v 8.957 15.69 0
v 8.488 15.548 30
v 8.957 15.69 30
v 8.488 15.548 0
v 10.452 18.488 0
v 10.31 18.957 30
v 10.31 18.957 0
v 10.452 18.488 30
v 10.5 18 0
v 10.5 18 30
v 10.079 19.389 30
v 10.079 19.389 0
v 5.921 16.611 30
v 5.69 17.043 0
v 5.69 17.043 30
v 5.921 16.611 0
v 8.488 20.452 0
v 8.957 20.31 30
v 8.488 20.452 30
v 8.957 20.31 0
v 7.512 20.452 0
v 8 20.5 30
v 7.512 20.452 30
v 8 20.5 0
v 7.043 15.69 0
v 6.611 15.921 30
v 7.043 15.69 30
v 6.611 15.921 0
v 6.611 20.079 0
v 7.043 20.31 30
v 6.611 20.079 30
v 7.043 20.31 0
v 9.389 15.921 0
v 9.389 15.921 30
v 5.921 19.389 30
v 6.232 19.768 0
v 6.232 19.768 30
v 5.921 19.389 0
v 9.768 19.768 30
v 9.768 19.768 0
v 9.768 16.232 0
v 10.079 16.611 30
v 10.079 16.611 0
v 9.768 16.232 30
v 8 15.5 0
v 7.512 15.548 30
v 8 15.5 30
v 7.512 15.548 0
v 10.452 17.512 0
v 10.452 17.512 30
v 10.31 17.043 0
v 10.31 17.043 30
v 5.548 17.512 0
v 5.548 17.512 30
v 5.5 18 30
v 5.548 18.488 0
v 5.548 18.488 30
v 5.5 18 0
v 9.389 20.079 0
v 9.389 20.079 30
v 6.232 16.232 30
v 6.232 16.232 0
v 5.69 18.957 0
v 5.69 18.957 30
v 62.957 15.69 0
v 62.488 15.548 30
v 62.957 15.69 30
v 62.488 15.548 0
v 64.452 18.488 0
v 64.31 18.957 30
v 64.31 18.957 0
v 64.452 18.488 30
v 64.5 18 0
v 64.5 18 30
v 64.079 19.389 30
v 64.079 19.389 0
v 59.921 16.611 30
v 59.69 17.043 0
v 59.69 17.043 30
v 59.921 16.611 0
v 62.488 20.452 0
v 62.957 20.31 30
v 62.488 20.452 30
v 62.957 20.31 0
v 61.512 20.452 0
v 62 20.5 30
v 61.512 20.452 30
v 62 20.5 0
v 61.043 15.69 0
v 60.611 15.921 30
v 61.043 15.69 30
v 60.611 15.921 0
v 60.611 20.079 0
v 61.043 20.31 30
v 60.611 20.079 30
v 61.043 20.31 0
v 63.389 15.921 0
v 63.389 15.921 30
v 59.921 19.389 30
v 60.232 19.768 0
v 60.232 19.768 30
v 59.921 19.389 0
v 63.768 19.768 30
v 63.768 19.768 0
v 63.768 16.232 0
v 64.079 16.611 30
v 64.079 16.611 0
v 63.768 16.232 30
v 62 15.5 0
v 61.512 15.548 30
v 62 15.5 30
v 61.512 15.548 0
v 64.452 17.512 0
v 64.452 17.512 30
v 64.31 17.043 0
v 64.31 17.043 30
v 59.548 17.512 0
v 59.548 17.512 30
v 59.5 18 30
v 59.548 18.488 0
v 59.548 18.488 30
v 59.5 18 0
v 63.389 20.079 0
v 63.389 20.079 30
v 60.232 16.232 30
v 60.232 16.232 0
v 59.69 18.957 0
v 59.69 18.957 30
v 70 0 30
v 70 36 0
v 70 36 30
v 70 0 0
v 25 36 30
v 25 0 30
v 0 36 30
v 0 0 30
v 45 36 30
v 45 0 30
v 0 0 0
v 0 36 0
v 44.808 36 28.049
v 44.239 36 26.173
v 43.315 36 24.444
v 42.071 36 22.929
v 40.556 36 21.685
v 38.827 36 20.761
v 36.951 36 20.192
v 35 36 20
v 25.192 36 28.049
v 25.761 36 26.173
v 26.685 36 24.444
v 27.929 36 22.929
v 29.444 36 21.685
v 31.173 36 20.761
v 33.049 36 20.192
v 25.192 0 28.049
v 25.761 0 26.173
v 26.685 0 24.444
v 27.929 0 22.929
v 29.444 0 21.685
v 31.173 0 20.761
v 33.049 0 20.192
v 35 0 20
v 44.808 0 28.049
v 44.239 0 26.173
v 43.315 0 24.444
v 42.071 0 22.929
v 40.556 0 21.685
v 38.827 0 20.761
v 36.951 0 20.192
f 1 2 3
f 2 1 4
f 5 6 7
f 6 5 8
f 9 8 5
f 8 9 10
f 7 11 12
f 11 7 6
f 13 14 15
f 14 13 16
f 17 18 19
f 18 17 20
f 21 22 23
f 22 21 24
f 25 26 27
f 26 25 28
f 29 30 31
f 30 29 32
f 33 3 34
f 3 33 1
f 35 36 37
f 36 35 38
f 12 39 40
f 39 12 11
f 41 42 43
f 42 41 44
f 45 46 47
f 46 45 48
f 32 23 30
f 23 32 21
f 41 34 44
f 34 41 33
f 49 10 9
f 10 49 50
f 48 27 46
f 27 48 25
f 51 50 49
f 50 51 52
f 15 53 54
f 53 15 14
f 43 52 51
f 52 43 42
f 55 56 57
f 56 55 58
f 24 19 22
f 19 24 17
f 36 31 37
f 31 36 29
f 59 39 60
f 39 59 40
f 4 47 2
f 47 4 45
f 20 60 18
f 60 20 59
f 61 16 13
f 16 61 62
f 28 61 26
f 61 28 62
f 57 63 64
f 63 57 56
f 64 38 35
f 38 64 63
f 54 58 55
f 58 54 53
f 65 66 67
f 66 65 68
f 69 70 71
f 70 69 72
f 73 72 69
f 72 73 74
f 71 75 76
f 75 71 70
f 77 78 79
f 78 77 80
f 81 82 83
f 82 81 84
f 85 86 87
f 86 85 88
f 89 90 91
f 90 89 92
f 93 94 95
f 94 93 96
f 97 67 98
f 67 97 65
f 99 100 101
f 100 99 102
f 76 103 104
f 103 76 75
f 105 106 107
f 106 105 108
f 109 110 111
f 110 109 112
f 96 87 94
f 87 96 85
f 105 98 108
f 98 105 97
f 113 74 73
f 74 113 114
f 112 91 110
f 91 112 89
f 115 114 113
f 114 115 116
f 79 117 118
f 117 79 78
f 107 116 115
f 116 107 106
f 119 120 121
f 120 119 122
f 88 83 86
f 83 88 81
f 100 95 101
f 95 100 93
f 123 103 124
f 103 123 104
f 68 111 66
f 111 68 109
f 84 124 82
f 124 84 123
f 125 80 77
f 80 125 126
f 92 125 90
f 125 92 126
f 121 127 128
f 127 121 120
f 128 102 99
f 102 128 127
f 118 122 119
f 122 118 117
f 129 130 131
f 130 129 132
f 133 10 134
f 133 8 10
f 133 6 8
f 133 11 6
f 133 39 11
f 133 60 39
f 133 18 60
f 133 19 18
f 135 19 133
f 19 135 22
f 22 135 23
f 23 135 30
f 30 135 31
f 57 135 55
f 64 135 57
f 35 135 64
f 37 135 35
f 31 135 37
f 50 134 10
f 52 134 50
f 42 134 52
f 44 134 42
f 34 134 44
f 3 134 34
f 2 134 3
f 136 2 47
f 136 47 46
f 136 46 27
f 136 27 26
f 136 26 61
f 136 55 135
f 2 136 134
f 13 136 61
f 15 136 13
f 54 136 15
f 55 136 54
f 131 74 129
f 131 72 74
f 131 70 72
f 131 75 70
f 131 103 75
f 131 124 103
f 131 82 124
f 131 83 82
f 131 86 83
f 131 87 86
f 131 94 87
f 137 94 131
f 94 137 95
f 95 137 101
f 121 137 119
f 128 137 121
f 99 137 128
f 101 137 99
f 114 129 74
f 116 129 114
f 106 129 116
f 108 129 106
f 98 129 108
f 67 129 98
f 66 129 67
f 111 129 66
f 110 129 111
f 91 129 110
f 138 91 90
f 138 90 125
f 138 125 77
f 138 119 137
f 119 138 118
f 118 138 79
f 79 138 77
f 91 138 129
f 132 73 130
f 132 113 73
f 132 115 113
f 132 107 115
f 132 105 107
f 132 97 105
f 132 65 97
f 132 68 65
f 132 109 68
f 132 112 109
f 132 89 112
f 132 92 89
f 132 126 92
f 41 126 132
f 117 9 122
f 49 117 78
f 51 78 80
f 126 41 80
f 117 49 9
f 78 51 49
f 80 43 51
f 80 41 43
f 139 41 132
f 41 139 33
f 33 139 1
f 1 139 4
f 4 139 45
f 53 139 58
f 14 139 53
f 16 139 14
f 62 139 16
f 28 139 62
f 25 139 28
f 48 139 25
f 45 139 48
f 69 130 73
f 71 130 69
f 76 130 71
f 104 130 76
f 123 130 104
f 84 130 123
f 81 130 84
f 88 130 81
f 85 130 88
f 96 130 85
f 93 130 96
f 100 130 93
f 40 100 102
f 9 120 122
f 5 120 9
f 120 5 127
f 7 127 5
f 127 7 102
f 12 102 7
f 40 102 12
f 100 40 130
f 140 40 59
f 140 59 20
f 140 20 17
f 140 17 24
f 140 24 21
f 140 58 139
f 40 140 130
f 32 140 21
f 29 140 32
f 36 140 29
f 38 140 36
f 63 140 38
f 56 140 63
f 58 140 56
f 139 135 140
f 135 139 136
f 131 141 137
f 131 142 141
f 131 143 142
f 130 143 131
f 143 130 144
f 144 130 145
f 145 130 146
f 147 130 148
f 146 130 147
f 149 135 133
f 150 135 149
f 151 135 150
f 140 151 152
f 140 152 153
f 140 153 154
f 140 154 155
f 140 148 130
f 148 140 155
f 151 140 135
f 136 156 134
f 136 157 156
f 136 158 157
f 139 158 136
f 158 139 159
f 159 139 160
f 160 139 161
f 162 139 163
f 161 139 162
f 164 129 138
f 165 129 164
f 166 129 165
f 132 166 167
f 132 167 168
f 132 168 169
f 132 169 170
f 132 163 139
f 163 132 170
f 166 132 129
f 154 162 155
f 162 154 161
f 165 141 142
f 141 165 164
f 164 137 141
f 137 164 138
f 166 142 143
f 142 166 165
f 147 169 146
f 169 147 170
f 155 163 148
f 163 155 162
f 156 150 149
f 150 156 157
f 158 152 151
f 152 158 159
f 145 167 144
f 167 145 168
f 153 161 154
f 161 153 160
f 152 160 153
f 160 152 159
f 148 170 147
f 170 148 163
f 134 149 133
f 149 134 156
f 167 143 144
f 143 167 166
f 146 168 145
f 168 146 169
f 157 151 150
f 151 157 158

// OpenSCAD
$fn = 32;

// ----------------------------------------------------------------------
// Saddle clamp: plain shaft clamp
// ----------------------------------------------------------------------

// --- parameters (mm) ---
blk_l = 70;               // block length, X
blk_w = 36;               // block width, Y
blk_h = 30;               // block height
clamp_r = 10;             // shaft groove radius
hole_r = 2.5;             // bolt hole radius
hole_m = 8;               // bolt hole margin from the ends

saw_depth = clamp_r + 3;  // saw kerf depth

difference() {
  cube([blk_l, blk_w, blk_h]);
  translate([blk_l / 2, -1, blk_h])
    rotate([-90, 0, 0])
      cylinder(h = blk_w + 2, r = clamp_r);
  for (sx = [0, 1])
    translate([sx ? blk_l - hole_m : hole_m, blk_w / 2, -1])
      cylinder(r = hole_r, h = blk_h + 2);
}
